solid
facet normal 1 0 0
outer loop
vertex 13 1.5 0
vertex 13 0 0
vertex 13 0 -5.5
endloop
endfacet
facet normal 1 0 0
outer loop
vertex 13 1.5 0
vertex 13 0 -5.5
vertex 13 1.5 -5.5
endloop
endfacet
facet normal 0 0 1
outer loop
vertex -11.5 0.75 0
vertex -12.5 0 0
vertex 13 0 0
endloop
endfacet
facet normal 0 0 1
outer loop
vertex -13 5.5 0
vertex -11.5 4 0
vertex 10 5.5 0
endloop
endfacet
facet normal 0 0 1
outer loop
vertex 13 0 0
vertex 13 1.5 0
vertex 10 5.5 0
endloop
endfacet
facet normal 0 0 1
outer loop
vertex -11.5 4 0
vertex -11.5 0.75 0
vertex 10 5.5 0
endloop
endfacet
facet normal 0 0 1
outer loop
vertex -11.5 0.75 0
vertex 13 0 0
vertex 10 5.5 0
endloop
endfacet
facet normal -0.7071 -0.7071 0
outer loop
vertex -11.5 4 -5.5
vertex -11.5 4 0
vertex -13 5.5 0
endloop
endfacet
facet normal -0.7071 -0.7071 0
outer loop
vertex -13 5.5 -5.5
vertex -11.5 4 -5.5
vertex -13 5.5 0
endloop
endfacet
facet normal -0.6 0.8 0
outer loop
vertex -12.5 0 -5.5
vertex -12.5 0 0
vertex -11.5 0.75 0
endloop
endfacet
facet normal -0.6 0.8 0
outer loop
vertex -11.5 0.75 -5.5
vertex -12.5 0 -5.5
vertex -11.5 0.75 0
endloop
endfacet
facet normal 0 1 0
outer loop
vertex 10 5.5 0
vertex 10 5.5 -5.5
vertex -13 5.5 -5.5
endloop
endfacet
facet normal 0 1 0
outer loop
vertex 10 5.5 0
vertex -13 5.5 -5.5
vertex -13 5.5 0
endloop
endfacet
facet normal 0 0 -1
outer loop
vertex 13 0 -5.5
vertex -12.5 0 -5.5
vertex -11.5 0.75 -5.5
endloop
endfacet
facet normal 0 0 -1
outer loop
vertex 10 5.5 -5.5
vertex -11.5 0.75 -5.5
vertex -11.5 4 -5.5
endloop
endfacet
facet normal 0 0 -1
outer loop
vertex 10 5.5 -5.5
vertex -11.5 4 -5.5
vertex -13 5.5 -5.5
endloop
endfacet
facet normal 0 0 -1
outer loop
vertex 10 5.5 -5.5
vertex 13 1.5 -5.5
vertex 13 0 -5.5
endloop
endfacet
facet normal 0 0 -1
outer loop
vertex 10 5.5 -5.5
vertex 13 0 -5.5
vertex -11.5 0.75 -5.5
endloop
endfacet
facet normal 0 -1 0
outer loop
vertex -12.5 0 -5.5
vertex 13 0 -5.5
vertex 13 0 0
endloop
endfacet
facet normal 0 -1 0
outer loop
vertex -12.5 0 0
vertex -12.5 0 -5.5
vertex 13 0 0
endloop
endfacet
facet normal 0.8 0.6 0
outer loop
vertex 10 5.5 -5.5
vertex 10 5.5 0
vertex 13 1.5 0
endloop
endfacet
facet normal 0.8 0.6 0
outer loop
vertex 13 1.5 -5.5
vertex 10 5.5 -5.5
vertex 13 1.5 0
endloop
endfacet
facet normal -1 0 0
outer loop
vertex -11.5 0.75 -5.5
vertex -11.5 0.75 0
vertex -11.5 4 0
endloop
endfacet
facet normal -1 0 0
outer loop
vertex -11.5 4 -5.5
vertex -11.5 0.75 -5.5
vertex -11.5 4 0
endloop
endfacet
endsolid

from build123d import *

# Parameters (mm, degrees)
F0_W     = 5.5
F0_H     = 5.5
F1_DEPTH = 13
F3_DEPTH = 5.501


with BuildPart() as f1:
    # F0 (on Right) → F1 (new body, symmetric)
    with BuildSketch(Plane.YZ):
        with Locations((2.75, -2.75)):
            Rectangle(F0_W, F0_H)
    extrude(amount=F1_DEPTH, both=True)

    # F2 (on face) → F3 (cut, through all)
    with BuildSketch(Plane.XY):
        Polygon((-11.5, 4), (-13, 5.5), (-13, 0), (-12.5, 0), (-11.5, 0.75), align=None)
        Polygon((13, 5.5), (10, 5.5), (13, 1.5), align=None)
    extrude(amount=-F3_DEPTH, mode=Mode.SUBTRACT)


solid = f1.part
